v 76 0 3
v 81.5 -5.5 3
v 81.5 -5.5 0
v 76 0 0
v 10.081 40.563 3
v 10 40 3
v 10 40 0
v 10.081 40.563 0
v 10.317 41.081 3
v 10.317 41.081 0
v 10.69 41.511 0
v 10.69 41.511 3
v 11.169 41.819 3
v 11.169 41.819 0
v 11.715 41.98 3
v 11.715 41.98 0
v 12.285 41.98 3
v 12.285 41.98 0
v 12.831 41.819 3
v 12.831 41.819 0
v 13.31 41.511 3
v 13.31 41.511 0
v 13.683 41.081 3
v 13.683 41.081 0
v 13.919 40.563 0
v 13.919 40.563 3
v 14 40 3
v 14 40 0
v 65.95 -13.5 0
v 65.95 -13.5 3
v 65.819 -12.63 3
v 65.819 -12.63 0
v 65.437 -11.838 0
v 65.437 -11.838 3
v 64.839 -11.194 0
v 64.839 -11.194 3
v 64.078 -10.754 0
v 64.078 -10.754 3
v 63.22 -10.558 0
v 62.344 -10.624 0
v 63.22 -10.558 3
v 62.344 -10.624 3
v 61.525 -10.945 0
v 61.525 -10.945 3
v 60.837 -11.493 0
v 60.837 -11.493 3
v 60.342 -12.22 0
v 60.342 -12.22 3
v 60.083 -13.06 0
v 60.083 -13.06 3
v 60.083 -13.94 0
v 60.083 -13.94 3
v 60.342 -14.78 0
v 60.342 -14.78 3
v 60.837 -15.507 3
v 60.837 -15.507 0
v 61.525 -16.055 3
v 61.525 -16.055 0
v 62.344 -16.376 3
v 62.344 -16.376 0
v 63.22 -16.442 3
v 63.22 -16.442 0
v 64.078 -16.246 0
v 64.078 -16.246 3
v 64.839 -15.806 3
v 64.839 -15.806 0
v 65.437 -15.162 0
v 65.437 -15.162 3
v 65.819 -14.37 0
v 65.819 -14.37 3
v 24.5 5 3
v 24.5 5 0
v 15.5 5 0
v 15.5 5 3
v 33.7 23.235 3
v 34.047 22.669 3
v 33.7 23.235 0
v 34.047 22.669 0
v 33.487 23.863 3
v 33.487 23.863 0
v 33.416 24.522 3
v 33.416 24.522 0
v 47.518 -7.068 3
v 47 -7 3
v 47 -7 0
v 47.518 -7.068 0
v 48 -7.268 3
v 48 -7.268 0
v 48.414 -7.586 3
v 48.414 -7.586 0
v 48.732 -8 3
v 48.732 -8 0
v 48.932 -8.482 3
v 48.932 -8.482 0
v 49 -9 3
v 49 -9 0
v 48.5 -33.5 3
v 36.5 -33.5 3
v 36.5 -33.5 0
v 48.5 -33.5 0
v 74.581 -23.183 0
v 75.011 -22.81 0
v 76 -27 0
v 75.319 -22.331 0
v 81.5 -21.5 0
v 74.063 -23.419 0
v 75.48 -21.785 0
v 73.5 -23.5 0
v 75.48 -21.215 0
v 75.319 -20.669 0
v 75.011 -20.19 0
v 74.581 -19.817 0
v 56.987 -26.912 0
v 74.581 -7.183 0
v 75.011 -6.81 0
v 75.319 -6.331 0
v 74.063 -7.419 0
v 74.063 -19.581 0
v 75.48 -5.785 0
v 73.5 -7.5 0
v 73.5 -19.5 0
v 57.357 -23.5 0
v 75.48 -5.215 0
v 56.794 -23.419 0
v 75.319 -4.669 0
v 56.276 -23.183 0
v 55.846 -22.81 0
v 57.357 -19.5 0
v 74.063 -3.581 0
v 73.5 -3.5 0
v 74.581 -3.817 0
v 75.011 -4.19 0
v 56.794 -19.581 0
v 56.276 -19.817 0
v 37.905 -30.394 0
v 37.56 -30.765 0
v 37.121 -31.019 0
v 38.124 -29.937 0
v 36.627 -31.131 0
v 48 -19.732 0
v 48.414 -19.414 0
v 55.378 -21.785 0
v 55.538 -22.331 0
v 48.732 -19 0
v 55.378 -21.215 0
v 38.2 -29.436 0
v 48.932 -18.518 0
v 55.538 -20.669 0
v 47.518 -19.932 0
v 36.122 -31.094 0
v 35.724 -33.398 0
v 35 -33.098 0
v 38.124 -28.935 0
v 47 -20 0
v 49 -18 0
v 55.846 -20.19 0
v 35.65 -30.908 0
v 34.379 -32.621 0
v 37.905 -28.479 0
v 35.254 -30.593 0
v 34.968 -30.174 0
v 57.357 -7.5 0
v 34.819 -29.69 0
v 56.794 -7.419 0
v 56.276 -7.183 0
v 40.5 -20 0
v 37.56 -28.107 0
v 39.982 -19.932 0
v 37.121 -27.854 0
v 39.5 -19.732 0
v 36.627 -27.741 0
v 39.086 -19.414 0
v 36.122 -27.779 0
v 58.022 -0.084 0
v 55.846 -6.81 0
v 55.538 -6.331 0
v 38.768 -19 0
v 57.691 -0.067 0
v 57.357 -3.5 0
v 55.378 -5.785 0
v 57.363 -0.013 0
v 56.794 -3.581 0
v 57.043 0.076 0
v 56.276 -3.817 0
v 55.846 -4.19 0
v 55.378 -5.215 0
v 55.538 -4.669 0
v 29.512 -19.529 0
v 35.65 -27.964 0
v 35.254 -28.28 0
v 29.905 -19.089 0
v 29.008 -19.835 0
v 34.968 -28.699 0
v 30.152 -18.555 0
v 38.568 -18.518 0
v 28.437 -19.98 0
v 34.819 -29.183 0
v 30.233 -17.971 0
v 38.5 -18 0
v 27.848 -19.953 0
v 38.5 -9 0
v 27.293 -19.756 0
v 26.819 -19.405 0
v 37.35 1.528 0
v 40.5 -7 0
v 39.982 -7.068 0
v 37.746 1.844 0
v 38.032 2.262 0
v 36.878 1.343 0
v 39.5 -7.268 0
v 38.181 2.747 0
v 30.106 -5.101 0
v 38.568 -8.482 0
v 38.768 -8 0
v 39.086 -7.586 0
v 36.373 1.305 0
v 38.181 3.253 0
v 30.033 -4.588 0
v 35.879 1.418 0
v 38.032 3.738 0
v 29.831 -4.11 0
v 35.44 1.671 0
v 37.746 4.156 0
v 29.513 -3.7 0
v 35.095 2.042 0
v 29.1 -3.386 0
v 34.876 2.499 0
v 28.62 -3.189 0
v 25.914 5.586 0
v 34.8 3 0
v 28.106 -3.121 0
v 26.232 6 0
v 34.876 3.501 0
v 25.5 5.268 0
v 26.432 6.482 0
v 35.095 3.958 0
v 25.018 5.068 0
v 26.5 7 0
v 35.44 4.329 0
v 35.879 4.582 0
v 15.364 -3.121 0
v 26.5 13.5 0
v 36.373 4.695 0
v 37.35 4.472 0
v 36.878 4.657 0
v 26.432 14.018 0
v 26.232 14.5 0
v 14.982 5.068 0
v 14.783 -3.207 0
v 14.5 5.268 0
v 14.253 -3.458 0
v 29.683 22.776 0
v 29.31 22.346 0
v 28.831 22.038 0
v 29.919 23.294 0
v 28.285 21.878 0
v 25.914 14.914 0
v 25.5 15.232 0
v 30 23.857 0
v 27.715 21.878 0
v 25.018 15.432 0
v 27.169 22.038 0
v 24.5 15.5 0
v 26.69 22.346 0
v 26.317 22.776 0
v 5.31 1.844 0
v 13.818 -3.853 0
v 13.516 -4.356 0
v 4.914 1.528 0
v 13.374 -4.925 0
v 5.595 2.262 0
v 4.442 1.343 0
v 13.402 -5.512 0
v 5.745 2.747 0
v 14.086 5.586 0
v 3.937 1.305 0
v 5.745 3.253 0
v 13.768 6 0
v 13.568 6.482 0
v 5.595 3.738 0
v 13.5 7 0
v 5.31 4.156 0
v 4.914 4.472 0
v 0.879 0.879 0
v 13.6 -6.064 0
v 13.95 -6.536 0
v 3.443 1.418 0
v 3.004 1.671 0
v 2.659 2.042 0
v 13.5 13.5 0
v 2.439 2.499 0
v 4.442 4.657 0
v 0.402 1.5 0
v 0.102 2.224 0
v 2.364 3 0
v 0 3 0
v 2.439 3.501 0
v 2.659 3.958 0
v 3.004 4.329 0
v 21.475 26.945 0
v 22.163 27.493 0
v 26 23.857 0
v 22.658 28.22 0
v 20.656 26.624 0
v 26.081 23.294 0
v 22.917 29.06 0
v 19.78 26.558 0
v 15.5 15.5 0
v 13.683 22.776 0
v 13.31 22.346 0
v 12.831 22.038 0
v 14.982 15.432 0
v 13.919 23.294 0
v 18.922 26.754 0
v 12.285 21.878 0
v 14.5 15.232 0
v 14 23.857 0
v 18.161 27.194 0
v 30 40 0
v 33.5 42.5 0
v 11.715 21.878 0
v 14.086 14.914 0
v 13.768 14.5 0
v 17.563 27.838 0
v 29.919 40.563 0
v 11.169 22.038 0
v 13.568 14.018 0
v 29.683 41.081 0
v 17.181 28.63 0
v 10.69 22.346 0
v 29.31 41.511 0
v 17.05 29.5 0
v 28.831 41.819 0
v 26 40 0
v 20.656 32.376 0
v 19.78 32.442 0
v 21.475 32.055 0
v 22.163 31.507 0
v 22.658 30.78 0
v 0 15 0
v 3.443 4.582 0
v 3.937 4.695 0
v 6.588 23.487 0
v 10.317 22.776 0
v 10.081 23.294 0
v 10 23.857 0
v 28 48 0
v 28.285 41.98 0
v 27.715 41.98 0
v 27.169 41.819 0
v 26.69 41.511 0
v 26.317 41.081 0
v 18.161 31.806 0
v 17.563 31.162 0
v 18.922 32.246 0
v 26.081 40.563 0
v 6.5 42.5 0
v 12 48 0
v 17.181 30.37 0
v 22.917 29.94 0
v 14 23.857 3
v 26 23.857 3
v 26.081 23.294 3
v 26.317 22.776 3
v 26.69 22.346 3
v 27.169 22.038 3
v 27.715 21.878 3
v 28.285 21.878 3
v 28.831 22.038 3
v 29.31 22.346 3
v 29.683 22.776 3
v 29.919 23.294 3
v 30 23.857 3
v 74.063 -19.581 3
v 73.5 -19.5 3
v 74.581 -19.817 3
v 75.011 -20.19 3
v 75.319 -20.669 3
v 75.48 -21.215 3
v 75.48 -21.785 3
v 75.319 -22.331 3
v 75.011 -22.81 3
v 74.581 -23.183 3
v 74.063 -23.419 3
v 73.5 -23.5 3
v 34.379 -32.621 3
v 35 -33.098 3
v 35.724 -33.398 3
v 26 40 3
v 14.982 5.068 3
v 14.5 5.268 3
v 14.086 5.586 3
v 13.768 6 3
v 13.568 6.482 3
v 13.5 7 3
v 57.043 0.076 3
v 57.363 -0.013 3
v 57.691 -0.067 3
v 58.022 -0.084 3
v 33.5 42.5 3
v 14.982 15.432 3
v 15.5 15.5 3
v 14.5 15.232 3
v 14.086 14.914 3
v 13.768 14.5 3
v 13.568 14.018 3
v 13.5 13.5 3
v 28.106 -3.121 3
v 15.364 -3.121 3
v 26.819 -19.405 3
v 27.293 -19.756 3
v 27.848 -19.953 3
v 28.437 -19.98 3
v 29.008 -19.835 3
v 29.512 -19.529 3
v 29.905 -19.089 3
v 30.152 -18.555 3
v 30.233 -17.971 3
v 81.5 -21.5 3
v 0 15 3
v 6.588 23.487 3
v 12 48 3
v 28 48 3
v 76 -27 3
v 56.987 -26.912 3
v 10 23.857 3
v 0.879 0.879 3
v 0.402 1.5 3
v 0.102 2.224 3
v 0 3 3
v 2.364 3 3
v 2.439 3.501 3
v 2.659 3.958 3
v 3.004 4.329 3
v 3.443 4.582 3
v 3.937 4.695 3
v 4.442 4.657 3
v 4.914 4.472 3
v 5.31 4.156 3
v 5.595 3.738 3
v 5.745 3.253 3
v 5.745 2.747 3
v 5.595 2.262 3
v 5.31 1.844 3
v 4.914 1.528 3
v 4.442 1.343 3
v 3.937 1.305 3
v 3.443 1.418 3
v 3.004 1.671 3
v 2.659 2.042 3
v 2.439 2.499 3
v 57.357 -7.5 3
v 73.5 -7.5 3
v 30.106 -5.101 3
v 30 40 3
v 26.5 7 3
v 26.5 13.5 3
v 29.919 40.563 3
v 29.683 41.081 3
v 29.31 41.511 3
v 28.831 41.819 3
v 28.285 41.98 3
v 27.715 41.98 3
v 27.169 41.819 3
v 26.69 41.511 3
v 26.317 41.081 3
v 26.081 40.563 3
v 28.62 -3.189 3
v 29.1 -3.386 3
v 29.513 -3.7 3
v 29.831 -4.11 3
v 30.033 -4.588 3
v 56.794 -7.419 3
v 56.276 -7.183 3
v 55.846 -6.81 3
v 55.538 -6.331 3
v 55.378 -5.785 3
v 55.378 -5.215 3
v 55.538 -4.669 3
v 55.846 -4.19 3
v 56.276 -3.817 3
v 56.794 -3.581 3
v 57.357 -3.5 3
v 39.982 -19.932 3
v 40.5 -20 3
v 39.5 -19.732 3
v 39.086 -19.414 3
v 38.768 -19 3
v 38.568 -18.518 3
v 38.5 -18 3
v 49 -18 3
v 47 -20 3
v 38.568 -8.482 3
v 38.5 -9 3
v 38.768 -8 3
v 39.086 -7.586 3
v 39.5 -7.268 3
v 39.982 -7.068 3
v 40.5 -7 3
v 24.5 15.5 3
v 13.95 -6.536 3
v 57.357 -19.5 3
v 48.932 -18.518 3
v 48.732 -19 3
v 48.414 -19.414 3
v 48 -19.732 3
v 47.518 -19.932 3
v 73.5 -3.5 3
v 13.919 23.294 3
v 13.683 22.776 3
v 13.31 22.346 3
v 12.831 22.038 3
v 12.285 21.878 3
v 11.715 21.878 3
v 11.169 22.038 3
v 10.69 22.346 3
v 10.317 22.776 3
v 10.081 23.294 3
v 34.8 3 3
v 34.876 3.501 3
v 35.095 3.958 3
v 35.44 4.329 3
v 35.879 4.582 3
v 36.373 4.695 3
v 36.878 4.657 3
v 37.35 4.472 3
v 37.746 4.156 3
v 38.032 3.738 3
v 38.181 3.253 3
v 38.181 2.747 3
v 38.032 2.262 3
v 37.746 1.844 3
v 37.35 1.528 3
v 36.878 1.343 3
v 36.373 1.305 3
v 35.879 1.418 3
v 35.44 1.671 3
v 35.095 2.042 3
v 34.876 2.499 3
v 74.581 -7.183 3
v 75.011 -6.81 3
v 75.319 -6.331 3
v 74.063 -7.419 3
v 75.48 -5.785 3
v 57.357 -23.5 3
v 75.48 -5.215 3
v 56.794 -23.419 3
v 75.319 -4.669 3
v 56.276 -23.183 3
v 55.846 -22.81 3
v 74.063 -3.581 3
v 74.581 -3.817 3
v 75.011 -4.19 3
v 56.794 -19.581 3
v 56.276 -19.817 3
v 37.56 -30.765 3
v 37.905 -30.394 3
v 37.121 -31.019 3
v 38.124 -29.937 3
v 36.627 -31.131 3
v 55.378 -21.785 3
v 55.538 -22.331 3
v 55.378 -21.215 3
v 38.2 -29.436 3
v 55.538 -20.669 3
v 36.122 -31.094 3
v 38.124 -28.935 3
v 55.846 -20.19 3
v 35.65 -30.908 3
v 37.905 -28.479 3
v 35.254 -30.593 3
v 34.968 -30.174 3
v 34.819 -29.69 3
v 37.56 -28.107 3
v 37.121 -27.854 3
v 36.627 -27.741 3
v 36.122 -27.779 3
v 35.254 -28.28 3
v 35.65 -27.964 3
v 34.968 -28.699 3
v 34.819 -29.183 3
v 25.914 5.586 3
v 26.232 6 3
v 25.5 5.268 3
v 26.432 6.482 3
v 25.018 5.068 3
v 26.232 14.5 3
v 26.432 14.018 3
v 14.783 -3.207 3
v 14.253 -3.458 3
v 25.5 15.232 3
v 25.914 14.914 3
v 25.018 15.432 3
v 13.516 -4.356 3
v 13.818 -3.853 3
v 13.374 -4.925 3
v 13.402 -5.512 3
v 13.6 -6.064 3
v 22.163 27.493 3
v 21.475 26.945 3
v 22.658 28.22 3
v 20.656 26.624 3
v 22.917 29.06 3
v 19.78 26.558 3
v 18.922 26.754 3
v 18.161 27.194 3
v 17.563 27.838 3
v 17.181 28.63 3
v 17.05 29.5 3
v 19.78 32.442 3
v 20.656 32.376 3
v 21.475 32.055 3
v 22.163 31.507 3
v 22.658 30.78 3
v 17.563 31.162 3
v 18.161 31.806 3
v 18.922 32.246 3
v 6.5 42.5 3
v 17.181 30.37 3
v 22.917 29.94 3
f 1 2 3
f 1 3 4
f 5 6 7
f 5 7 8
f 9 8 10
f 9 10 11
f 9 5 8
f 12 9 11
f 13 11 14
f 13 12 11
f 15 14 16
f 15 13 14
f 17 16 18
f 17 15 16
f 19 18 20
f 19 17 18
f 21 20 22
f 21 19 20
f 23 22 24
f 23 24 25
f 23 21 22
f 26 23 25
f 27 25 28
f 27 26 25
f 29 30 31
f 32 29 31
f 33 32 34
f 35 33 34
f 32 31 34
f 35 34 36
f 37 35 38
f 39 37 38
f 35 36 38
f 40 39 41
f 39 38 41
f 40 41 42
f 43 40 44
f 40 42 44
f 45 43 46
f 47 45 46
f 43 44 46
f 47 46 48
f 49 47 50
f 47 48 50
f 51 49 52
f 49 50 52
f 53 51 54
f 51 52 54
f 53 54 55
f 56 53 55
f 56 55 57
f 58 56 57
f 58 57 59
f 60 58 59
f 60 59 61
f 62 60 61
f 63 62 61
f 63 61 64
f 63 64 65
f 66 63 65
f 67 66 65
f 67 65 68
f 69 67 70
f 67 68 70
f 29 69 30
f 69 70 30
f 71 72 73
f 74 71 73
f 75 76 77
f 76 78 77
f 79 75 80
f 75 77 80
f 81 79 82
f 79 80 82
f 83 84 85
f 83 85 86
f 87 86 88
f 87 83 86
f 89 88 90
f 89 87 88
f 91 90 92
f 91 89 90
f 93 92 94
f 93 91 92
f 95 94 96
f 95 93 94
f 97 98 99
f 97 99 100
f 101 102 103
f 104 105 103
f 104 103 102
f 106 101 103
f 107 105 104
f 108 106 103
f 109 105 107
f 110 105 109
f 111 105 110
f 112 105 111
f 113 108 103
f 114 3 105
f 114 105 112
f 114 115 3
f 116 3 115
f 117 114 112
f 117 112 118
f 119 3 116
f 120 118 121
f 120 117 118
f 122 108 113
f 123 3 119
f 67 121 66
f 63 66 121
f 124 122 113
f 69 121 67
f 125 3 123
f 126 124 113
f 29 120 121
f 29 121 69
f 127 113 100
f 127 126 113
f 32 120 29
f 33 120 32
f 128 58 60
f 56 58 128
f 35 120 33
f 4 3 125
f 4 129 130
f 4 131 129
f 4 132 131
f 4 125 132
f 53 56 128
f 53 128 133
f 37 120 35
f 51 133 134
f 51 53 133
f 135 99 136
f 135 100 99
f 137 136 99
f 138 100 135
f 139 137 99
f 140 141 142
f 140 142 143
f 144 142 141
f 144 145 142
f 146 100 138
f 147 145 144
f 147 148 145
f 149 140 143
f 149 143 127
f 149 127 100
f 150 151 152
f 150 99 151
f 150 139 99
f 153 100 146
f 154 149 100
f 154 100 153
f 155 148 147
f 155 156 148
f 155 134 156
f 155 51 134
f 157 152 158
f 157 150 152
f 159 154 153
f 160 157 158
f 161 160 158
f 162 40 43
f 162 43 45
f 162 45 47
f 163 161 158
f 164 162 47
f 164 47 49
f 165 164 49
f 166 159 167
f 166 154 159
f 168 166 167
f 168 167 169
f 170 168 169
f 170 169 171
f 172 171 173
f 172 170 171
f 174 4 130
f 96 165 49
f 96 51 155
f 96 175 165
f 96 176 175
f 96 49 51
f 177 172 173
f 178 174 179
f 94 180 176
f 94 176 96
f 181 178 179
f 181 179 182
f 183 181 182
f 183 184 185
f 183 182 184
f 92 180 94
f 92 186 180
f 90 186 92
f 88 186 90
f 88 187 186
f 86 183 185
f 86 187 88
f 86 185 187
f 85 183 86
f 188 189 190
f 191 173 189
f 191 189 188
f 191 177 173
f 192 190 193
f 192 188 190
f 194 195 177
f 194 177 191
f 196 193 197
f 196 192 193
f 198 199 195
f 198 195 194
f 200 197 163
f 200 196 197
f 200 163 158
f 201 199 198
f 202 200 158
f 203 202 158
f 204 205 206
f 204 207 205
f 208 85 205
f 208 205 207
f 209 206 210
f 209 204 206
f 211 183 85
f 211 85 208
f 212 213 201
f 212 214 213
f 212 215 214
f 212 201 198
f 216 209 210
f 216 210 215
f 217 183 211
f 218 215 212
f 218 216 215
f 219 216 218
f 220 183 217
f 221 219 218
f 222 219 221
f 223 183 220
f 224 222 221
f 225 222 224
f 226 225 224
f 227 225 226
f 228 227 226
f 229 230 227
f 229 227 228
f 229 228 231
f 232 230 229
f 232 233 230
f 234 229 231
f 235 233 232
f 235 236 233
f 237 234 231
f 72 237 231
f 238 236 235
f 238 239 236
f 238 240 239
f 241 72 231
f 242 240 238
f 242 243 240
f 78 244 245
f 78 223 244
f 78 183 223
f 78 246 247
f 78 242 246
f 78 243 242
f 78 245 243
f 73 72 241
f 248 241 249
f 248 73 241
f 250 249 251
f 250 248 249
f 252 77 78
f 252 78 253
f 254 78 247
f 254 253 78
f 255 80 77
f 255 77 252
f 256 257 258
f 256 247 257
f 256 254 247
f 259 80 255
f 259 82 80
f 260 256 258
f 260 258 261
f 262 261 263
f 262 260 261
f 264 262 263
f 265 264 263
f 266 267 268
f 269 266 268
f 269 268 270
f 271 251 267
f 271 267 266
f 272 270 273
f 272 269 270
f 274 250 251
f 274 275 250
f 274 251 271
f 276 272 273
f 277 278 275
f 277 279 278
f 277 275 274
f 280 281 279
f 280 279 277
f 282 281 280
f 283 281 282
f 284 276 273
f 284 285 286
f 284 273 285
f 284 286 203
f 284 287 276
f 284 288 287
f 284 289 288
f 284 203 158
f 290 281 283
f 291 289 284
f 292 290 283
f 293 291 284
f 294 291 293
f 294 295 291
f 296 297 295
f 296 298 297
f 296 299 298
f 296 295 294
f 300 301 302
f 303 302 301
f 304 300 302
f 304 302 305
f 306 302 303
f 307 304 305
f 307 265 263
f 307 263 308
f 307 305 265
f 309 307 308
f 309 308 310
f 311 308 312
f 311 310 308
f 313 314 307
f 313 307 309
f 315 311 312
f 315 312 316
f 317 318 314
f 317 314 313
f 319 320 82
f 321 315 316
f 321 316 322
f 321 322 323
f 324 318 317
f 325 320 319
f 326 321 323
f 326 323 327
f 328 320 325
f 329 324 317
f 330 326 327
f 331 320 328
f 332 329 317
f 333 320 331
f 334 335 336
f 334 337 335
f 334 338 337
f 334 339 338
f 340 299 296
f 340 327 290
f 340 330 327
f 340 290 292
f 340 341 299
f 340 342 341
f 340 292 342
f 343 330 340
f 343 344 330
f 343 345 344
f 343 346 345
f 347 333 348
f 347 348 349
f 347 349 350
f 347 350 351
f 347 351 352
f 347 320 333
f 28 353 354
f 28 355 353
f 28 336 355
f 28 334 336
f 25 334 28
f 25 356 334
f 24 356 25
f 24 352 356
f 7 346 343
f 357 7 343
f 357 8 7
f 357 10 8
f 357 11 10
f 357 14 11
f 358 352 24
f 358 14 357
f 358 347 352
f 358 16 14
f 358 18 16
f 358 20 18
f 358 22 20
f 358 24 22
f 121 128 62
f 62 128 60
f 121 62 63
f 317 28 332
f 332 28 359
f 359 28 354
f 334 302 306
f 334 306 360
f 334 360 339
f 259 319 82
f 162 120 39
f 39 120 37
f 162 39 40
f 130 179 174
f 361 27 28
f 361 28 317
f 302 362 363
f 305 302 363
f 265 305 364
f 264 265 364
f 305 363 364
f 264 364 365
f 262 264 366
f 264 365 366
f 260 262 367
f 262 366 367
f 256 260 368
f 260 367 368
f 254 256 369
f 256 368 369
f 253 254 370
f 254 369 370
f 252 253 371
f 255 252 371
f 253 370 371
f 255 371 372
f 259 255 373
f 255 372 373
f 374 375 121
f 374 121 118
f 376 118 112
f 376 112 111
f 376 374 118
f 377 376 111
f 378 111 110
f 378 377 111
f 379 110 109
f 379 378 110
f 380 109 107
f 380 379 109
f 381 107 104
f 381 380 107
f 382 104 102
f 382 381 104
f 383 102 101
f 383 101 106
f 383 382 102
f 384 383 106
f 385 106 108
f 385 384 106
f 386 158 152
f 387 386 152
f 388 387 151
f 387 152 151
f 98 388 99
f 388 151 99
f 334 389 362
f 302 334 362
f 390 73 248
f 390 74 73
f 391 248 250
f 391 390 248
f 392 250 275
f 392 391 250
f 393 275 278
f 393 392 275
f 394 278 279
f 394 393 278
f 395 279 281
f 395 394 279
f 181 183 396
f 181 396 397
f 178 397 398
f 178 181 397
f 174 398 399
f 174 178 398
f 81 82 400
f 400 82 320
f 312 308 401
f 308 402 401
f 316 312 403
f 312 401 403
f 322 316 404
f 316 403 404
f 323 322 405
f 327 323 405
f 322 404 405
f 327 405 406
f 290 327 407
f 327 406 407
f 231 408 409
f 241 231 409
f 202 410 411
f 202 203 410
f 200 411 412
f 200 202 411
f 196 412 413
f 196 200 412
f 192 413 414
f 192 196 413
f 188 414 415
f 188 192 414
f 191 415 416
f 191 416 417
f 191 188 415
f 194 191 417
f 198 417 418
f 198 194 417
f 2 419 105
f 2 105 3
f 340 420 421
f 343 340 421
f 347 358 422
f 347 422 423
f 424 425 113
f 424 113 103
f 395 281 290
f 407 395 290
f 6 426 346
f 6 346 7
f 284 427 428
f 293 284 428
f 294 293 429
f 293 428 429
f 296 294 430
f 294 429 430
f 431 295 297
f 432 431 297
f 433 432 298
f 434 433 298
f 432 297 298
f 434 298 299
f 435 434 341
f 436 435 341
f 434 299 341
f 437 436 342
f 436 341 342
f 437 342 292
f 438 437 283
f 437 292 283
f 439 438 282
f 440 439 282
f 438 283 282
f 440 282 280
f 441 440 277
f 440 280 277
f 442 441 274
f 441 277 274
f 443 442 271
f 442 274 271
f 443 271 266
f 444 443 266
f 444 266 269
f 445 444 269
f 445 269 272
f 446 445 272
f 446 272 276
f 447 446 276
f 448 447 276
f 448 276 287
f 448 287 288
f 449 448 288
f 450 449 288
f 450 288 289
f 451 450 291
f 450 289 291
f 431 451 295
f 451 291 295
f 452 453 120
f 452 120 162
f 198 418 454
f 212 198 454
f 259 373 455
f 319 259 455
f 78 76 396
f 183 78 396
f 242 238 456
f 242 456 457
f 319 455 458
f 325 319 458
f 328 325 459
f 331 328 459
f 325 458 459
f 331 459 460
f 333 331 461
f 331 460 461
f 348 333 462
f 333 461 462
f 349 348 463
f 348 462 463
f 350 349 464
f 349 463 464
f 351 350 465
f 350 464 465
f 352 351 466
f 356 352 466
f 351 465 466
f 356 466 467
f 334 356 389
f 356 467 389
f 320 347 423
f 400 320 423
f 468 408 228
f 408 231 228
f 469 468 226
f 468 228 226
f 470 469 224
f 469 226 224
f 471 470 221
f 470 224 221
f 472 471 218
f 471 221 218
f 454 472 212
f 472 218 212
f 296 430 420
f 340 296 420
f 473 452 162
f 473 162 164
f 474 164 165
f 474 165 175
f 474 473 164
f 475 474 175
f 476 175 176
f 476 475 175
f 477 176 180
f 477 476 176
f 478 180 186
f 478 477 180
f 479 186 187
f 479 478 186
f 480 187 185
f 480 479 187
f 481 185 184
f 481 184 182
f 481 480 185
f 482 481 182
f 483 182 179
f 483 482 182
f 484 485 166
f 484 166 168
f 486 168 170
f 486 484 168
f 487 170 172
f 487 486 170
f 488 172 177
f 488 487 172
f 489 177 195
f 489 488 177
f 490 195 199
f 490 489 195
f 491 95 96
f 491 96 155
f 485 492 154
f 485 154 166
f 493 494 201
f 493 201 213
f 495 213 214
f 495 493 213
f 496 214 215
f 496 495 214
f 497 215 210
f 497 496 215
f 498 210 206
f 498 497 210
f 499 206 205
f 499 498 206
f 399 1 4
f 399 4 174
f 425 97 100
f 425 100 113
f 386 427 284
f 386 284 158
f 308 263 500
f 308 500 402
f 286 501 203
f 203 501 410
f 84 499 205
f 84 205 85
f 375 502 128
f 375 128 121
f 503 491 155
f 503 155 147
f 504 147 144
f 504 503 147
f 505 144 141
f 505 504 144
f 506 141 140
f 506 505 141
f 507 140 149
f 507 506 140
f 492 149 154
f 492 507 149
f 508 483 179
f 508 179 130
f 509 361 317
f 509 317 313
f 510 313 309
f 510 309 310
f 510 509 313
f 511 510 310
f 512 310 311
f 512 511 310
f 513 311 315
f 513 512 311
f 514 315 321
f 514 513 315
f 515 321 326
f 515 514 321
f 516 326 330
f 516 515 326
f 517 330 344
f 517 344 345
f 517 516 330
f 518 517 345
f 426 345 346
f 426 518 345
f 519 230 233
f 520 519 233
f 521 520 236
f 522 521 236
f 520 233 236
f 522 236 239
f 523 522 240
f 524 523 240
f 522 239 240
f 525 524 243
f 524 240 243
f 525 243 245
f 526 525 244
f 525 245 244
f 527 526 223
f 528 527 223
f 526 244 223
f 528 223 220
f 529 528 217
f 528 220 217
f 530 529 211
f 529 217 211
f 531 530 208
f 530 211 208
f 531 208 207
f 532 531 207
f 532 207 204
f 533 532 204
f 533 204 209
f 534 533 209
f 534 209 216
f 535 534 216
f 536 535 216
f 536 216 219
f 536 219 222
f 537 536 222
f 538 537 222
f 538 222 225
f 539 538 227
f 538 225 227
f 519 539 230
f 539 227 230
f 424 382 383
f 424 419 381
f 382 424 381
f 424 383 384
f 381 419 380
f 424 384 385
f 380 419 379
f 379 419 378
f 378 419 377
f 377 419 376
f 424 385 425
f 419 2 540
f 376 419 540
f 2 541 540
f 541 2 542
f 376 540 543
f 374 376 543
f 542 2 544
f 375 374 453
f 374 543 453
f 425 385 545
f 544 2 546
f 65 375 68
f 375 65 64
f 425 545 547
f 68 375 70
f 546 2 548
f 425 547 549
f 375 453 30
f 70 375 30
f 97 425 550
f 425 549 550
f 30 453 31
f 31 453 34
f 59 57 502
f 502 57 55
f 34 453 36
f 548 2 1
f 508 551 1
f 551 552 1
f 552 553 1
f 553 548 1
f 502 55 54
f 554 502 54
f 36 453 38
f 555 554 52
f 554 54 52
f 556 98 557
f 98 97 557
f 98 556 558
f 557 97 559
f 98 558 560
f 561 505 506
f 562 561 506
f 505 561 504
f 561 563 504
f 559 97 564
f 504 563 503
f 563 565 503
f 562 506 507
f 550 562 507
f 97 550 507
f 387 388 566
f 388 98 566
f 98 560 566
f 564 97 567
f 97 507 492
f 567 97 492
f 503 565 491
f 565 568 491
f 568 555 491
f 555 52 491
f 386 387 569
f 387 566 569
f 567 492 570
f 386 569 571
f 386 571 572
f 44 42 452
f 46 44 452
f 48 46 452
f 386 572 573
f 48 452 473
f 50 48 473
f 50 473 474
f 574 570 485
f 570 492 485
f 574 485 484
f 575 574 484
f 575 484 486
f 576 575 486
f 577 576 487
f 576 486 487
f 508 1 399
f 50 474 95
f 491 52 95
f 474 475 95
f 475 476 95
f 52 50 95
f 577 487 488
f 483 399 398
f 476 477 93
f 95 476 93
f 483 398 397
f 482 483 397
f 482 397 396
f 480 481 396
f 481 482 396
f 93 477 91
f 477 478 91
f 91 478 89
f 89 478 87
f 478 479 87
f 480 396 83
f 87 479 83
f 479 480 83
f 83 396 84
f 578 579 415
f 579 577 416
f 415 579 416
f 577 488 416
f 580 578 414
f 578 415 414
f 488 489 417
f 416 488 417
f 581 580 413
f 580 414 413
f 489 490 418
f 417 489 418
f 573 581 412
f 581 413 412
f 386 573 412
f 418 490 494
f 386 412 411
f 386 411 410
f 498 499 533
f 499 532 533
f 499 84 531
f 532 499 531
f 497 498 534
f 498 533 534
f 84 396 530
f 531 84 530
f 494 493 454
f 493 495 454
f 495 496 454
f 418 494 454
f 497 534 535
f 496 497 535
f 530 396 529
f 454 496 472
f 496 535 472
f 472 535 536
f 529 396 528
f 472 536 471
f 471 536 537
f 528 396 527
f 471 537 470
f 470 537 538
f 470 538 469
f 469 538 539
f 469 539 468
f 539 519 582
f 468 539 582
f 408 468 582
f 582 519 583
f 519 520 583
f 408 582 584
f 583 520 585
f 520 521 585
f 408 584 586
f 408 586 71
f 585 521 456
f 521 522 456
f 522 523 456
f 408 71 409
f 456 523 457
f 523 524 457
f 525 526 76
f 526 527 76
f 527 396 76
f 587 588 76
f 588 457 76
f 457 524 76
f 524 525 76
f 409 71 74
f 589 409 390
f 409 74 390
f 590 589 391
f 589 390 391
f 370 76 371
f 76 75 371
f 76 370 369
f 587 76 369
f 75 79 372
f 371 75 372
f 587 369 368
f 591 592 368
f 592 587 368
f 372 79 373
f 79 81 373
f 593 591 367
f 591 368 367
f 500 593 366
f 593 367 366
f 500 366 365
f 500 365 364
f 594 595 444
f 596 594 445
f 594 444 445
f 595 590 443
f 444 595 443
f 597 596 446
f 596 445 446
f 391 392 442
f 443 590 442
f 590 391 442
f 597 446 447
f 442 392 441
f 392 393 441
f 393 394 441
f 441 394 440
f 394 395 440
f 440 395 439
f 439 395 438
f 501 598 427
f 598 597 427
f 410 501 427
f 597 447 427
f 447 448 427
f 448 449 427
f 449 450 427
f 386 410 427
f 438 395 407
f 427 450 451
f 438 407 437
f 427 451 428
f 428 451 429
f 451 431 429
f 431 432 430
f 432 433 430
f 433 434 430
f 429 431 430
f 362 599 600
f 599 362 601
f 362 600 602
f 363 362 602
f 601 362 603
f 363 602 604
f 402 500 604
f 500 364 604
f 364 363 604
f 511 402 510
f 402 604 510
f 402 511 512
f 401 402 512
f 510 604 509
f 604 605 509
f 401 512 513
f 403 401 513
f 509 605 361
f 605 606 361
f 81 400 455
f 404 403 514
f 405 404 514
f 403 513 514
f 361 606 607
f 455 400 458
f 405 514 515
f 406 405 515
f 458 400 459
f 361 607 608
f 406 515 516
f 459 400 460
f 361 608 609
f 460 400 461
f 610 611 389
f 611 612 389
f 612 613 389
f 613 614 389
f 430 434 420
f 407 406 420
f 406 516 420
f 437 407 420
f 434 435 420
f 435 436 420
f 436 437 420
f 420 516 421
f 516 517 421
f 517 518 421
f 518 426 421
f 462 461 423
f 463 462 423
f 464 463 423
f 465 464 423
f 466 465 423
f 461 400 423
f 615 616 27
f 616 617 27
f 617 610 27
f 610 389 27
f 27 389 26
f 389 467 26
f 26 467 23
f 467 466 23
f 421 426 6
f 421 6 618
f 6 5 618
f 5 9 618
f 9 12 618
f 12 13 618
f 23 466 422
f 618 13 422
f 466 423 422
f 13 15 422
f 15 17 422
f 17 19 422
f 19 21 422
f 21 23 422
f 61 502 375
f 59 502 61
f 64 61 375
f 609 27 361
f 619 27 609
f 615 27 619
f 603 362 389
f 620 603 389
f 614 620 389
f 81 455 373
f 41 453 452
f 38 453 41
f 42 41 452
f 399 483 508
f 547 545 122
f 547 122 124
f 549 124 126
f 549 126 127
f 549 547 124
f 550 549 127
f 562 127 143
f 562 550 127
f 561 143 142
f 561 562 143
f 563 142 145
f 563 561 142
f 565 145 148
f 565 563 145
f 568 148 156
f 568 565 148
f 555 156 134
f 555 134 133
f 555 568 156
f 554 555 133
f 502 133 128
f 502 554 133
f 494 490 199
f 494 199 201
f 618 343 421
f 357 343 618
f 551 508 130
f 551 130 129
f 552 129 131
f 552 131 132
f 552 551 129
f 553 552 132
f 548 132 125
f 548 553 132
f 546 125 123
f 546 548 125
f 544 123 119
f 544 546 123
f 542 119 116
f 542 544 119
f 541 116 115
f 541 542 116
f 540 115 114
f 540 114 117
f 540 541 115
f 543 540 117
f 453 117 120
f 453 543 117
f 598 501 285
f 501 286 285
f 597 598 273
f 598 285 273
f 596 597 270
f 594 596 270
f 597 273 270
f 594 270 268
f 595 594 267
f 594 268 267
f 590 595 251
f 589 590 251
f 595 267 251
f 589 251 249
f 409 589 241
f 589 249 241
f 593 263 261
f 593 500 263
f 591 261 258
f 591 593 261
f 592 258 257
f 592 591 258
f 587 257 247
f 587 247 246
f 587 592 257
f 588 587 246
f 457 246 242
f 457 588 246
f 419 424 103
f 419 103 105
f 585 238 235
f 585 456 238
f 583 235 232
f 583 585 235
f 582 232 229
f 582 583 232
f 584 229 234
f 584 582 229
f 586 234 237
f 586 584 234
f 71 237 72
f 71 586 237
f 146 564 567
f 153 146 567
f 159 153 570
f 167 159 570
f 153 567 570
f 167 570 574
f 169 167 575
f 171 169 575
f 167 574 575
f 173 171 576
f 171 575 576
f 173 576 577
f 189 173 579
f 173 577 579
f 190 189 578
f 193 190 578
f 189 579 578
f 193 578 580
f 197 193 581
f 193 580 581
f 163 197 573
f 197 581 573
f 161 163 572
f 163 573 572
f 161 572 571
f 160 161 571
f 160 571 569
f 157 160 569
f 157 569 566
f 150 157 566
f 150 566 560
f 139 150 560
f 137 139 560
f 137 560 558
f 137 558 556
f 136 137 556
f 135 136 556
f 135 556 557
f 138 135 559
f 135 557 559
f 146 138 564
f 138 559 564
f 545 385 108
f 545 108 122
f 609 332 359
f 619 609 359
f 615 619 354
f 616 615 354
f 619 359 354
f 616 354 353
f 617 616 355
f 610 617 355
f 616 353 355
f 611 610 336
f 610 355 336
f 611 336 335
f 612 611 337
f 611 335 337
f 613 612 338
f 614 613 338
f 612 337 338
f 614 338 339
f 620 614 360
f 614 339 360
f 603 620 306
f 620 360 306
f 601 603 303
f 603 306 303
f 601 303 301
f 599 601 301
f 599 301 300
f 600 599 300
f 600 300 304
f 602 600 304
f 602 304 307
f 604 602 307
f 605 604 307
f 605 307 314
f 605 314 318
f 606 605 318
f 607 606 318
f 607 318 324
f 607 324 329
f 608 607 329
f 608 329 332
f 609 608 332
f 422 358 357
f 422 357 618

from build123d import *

# Parameters (mm, degrees)
SKETCH_1_W          = 40
SKETCH_1_H          = 48
EXTRUDE_1_DEPTH     = 3
CHAMFER_1_SIZE      = 12
SKETCH_2_R          = 2.95
SKETCH_2_W          = 13
SKETCH_2_H          = 10.5
CUT_EXTRUDE_1_DEPTH = 10
EXTRUDE_2_DEPTH     = 3
FILLET_1_R          = 2
CUT_EXTRUDE_3_DEPTH = 3
SKETCH_10_R         = 1.7
CUT_EXTRUDE_4_DEPTH = 3
SKETCH_12_R         = 1.7
SKETCH_12_R_2       = 2.95
EXTRUDE_4_DEPTH     = 3
FILLET_2_R          = 3
FILLET_3_R          = 13
FILLET_4_R          = 3
EXTRUDE_5_DEPTH     = 3
FILLET_5_R          = 2


with BuildPart() as part:
    # 草图1 → 凸台-拉伸1 (new body)
    with BuildSketch(Plane.XY):
        with Locations((20, 24)):
            Rectangle(SKETCH_1_W, SKETCH_1_H)
    extrude(amount=EXTRUDE_1_DEPTH)

    # 倒角1
    chamfer_1_edges = [part.edges().sort_by_distance(p)[0] for p in [
        (0, 48, 1.5),
        (40, 48, 1.5),
    ]]
    chamfer(chamfer_1_edges, length=CHAMFER_1_SIZE)

    # 草图2 → 切除-拉伸1 (cut)
    with BuildSketch(Plane(origin=(0, 0, 0), x_dir=(-1, 0, 0), z_dir=(0, 0, -1))):
        with Locations((-20, 29.5)):
            Circle(SKETCH_2_R)
        with BuildLine():
            Line((-6.676784368, 4.473797691), (-6.5, 42.5))
            Line((-6.5, 42.5), (0, 36))
            Line((0, 36), (0, 0))
            Line((0, 0), (-1.349561874, 1.722051065))
            ThreePointArc((-1.349561874, 1.722051065), (-2.686952607, 5.665410674), (-6.676784368, 4.473797691))
        make_face()
        with BuildLine():
            Line((-33.5, 42.5), (-40, 36))
            Line((-40, 36), (-40, 0))
            Line((-40, 0), (-38.650438126, 1.722051065))
            ThreePointArc((-38.650438126, 1.722051065), (-37.313047393, 5.665410674), (-33.323215632, 4.473797691))
            Line((-33.323215632, 4.473797691), (-33.5, 42.5))
        make_face()
        with Locations((-20, 10.25)):
            Rectangle(SKETCH_2_W, SKETCH_2_H)
    extrude(amount=-CUT_EXTRUDE_1_DEPTH, mode=Mode.SUBTRACT)

    # 草图6 → 凸台-拉伸2 (add)
    with BuildSketch(Plane.XY.offset(3)):
        Polygon((0, 0), (0, 15), (6.588392184, 23.486898846), (6.676784368, 4.473797691), (1.450726441, 4.473797691), (1.450726441, 0), align=None)
        Polygon((40, 15), (33.411607816, 23.486898846), (33.323215632, 4.473797691), (38.549273559, 4.473797691), (38.549273559, 0), (40, 0), align=None)
    extrude(amount=-EXTRUDE_2_DEPTH)

    # 圆角1
    fillet_1_edges = [part.edges().sort_by_distance(p)[0] for p in [
        (13.5, 15.5, 1.5),
        (13.5, 5, 1.5),
        (26.5, 5, 1.5),
        (26.5, 15.5, 1.5),
    ]]
    fillet(fillet_1_edges, radius=FILLET_1_R)

    # 草图7 → 切除-拉伸3 (cut)
    with BuildSketch(Plane.XY.offset(3)):
        with BuildLine():
            Line((14, 40), (14, 23.857322167))
            ThreePointArc((14, 23.857322167), (12, 21.857322167), (10, 23.857322167))
            Line((10, 23.857322167), (10, 40))
            ThreePointArc((10, 40), (12, 42), (14, 40))
        make_face()
        with BuildLine():
            Line((26, 40), (26, 23.857322167))
            ThreePointArc((26, 23.857322167), (28, 21.857322167), (30, 23.857322167))
            Line((30, 23.857322167), (30, 40))
            ThreePointArc((30, 40), (28, 42), (26, 40))
        make_face()
    extrude(amount=-CUT_EXTRUDE_3_DEPTH, mode=Mode.SUBTRACT)

    # 草图10 → 切除-拉伸4 (cut)
    with BuildSketch(Plane(origin=(0, 0, 0), x_dir=(-1, 0, 0), z_dir=(0, 0, -1))):
        with Locations((-4.063755404, 3)):
            Circle(SKETCH_10_R)
        with Locations((-36.5, 3)):
            Circle(SKETCH_10_R)
    extrude(amount=-CUT_EXTRUDE_4_DEPTH, mode=Mode.SUBTRACT)

    # 草图12 → 凸台-拉伸4 (add)
    with BuildSketch(Plane.XY.offset(3)):
        Polygon((33.5, 0), (33.5, -33.5), (48.5, -33.5), (56.986898846, -26.911607816), (76, -27), (81.5, -21.5), (81.5, -5.5), (76, 0), (56.986898846, -0.088392184), (48.5, 6.5), (40, 6.5), (40, 0), align=None)
        with Locations((36.5, -29.436244596)):
            Circle(SKETCH_12_R, mode=Mode.SUBTRACT)
        with BuildLine():
            ThreePointArc((40.5, -20), (39.085786438, -19.414213562), (38.5, -18))
            Line((38.5, -18), (38.5, -9))
            ThreePointArc((38.5, -9), (39.085786438, -7.585786438), (40.5, -7))
            Line((40.5, -7), (47, -7))
            ThreePointArc((47, -7), (48.414213562, -7.585786438), (49, -9))
            Line((49, -9), (49, -18))
            ThreePointArc((49, -18), (48.414213562, -19.414213562), (47, -20))
            Line((47, -20), (40.5, -20))
        make_face(mode=Mode.SUBTRACT)
        with BuildLine():
            ThreePointArc((73.5, -19.5), (75.5, -21.5), (73.5, -23.5))
            Line((73.5, -23.5), (57.357322167, -23.5))
            ThreePointArc((57.357322167, -23.5), (55.357322167, -21.5), (57.357322167, -19.5))
            Line((57.357322167, -19.5), (73.5, -19.5))
        make_face(mode=Mode.SUBTRACT)
        with Locations((63, -13.5)):
            Circle(SKETCH_12_R_2, mode=Mode.SUBTRACT)
        with BuildLine():
            ThreePointArc((57.357322167, -7.5), (55.357322167, -5.5), (57.357322167, -3.5))
            Line((57.357322167, -3.5), (73.5, -3.5))
            ThreePointArc((73.5, -3.5), (75.5, -5.5), (73.5, -7.5))
            Line((73.5, -7.5), (57.357322167, -7.5))
        make_face(mode=Mode.SUBTRACT)
    extrude(amount=-EXTRUDE_4_DEPTH)

    # 圆角2
    fillet_2_edges = [part.edges().sort_by_distance(p)[0] for p in [
        (33.5, -33.5, 1.5),
        (33.5, 0, 1.5),
        (0, 0, 1.5),
    ]]
    fillet(fillet_2_edges, radius=FILLET_2_R)

    # 圆角3
    # the kernel refuses this fillet: 13 mm, written as the material it adds along each edge
    with BuildSketch(Plane(origin=(40, 6.5, 3), x_dir=(0, 1, 0), z_dir=(0, 0, -1))) as fillet_3_piece_1:
        with BuildLine():
            CenterArc((12.400920193, 12.400920193), FILLET_3_R, 197.46185463, 55.076290741)
            Line((0, 8.5), (0, 0))
            Line((0, 0), (8.5, 0))
        make_face()
    extrude(amount=3)

    # 圆角4
    fillet_4_edges = [part.edges().sort_by_distance(p)[0] for p in [
        (33.411607816, 23.486898846, 1.5),
        (56.986898846, -0.088392184, 1.5),
    ]]
    fillet(fillet_4_edges, radius=FILLET_4_R)

    # 草图13 → 凸台-拉伸5 (add)
    # profile 1 of 2: a face of its own
    with BuildSketch(Plane.XY.offset(3)):
        Polygon((34.046638715, 22.66887787), (57.042815657, 0.076069922), (39.491091869, 6.043623433), align=None)
    # profile 2 of 2: a face of its own
    with BuildSketch(Plane.XY.offset(3)):
        Polygon((0.878679656, 0.878679656), (34.378679656, -32.621320344), (34.046638715, 0.878679656), align=None)
        Polygon((10.535533906, -3.121320344), (30.281807462, -22.8675939), (30.086088917, -3.121320344), align=None, mode=Mode.SUBTRACT)
    extrude(amount=-EXTRUDE_5_DEPTH)

    # 圆角5
    fillet_5_edges = [part.edges().sort_by_distance(p)[0] for p in [
        (30.086088917, -3.121320344, 1.5),
        (30.281807462, -22.8675939, 1.5),
        (10.535533906, -3.121320344, 1.5),
    ]]
    fillet(fillet_5_edges, radius=FILLET_5_R)


solid = part.part
